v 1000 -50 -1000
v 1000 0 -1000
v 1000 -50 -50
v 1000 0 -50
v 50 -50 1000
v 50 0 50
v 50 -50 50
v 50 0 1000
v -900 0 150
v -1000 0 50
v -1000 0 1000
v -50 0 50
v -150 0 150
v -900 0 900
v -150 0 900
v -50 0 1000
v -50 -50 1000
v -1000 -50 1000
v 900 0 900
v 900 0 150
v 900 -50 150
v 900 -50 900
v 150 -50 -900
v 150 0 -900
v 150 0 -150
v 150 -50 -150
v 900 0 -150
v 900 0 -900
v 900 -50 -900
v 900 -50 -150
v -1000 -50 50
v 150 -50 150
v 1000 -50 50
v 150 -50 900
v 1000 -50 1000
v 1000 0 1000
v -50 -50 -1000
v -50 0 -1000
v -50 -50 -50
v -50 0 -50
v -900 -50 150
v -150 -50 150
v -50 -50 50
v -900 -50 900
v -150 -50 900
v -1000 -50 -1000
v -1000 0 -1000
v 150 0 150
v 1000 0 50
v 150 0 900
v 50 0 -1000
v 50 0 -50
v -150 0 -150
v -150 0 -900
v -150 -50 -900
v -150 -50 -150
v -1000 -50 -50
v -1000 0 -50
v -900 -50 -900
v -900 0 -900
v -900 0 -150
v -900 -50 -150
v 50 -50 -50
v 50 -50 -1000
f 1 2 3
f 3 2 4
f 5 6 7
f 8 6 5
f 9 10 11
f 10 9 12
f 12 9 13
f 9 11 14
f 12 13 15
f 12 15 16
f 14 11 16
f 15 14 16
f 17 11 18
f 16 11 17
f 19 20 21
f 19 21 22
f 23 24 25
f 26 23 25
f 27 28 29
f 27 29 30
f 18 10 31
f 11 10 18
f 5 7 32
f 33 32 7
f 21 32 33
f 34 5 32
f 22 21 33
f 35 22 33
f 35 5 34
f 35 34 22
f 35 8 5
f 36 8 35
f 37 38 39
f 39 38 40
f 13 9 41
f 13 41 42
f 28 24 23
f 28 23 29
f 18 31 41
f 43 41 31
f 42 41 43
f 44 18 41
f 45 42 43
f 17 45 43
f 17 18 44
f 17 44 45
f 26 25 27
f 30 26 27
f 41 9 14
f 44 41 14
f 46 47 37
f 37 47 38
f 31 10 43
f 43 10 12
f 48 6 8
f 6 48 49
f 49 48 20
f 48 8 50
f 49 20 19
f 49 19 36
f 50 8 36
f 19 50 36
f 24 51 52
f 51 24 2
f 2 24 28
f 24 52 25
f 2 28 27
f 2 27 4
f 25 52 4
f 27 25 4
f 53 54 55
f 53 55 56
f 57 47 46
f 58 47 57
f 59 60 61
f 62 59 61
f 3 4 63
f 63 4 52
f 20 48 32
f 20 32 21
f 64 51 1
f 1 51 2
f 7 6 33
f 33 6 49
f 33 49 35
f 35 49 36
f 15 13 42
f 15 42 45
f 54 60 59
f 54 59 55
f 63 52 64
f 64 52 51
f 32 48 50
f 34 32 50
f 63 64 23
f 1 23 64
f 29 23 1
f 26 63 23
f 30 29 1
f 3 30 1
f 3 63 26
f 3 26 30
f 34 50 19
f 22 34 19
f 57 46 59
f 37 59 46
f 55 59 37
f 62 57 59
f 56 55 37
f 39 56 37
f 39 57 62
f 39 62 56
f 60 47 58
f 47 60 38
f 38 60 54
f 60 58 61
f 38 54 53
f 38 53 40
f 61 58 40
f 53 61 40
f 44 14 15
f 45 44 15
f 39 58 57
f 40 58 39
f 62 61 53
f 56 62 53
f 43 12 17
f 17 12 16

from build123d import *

# Parameters (mm, degrees)
F0_W     = 950
F0_H     = 950
F0_W_2   = 750
F0_H_2   = 750
F1_DEPTH = 50


with BuildPart() as f1:
    # F0 (on Front) → F1 (new body)
    with BuildSketch(Plane.XZ):
        with Locations((-525, 525)):
            Rectangle(F0_W, F0_H)
        with Locations((-525, 525)):
            Rectangle(F0_W_2, F0_H_2, mode=Mode.SUBTRACT)
        with Locations((-525, -525)):
            Rectangle(F0_W, F0_H)
        with Locations((-525, -525)):
            Rectangle(F0_W_2, F0_H_2, mode=Mode.SUBTRACT)
        with Locations((525, 525)):
            Rectangle(F0_W, F0_H)
        with Locations((525, 525)):
            Rectangle(F0_W_2, F0_H_2, mode=Mode.SUBTRACT)
        Polygon((1000, -50), (50, -50), (50, -900), (50, -1000), (150, -1000), (1000, -1000), align=None)
        with Locations((525, -525)):
            Rectangle(F0_W_2, F0_H_2, mode=Mode.SUBTRACT)
    extrude(amount=F1_DEPTH)


solid = f1.part
